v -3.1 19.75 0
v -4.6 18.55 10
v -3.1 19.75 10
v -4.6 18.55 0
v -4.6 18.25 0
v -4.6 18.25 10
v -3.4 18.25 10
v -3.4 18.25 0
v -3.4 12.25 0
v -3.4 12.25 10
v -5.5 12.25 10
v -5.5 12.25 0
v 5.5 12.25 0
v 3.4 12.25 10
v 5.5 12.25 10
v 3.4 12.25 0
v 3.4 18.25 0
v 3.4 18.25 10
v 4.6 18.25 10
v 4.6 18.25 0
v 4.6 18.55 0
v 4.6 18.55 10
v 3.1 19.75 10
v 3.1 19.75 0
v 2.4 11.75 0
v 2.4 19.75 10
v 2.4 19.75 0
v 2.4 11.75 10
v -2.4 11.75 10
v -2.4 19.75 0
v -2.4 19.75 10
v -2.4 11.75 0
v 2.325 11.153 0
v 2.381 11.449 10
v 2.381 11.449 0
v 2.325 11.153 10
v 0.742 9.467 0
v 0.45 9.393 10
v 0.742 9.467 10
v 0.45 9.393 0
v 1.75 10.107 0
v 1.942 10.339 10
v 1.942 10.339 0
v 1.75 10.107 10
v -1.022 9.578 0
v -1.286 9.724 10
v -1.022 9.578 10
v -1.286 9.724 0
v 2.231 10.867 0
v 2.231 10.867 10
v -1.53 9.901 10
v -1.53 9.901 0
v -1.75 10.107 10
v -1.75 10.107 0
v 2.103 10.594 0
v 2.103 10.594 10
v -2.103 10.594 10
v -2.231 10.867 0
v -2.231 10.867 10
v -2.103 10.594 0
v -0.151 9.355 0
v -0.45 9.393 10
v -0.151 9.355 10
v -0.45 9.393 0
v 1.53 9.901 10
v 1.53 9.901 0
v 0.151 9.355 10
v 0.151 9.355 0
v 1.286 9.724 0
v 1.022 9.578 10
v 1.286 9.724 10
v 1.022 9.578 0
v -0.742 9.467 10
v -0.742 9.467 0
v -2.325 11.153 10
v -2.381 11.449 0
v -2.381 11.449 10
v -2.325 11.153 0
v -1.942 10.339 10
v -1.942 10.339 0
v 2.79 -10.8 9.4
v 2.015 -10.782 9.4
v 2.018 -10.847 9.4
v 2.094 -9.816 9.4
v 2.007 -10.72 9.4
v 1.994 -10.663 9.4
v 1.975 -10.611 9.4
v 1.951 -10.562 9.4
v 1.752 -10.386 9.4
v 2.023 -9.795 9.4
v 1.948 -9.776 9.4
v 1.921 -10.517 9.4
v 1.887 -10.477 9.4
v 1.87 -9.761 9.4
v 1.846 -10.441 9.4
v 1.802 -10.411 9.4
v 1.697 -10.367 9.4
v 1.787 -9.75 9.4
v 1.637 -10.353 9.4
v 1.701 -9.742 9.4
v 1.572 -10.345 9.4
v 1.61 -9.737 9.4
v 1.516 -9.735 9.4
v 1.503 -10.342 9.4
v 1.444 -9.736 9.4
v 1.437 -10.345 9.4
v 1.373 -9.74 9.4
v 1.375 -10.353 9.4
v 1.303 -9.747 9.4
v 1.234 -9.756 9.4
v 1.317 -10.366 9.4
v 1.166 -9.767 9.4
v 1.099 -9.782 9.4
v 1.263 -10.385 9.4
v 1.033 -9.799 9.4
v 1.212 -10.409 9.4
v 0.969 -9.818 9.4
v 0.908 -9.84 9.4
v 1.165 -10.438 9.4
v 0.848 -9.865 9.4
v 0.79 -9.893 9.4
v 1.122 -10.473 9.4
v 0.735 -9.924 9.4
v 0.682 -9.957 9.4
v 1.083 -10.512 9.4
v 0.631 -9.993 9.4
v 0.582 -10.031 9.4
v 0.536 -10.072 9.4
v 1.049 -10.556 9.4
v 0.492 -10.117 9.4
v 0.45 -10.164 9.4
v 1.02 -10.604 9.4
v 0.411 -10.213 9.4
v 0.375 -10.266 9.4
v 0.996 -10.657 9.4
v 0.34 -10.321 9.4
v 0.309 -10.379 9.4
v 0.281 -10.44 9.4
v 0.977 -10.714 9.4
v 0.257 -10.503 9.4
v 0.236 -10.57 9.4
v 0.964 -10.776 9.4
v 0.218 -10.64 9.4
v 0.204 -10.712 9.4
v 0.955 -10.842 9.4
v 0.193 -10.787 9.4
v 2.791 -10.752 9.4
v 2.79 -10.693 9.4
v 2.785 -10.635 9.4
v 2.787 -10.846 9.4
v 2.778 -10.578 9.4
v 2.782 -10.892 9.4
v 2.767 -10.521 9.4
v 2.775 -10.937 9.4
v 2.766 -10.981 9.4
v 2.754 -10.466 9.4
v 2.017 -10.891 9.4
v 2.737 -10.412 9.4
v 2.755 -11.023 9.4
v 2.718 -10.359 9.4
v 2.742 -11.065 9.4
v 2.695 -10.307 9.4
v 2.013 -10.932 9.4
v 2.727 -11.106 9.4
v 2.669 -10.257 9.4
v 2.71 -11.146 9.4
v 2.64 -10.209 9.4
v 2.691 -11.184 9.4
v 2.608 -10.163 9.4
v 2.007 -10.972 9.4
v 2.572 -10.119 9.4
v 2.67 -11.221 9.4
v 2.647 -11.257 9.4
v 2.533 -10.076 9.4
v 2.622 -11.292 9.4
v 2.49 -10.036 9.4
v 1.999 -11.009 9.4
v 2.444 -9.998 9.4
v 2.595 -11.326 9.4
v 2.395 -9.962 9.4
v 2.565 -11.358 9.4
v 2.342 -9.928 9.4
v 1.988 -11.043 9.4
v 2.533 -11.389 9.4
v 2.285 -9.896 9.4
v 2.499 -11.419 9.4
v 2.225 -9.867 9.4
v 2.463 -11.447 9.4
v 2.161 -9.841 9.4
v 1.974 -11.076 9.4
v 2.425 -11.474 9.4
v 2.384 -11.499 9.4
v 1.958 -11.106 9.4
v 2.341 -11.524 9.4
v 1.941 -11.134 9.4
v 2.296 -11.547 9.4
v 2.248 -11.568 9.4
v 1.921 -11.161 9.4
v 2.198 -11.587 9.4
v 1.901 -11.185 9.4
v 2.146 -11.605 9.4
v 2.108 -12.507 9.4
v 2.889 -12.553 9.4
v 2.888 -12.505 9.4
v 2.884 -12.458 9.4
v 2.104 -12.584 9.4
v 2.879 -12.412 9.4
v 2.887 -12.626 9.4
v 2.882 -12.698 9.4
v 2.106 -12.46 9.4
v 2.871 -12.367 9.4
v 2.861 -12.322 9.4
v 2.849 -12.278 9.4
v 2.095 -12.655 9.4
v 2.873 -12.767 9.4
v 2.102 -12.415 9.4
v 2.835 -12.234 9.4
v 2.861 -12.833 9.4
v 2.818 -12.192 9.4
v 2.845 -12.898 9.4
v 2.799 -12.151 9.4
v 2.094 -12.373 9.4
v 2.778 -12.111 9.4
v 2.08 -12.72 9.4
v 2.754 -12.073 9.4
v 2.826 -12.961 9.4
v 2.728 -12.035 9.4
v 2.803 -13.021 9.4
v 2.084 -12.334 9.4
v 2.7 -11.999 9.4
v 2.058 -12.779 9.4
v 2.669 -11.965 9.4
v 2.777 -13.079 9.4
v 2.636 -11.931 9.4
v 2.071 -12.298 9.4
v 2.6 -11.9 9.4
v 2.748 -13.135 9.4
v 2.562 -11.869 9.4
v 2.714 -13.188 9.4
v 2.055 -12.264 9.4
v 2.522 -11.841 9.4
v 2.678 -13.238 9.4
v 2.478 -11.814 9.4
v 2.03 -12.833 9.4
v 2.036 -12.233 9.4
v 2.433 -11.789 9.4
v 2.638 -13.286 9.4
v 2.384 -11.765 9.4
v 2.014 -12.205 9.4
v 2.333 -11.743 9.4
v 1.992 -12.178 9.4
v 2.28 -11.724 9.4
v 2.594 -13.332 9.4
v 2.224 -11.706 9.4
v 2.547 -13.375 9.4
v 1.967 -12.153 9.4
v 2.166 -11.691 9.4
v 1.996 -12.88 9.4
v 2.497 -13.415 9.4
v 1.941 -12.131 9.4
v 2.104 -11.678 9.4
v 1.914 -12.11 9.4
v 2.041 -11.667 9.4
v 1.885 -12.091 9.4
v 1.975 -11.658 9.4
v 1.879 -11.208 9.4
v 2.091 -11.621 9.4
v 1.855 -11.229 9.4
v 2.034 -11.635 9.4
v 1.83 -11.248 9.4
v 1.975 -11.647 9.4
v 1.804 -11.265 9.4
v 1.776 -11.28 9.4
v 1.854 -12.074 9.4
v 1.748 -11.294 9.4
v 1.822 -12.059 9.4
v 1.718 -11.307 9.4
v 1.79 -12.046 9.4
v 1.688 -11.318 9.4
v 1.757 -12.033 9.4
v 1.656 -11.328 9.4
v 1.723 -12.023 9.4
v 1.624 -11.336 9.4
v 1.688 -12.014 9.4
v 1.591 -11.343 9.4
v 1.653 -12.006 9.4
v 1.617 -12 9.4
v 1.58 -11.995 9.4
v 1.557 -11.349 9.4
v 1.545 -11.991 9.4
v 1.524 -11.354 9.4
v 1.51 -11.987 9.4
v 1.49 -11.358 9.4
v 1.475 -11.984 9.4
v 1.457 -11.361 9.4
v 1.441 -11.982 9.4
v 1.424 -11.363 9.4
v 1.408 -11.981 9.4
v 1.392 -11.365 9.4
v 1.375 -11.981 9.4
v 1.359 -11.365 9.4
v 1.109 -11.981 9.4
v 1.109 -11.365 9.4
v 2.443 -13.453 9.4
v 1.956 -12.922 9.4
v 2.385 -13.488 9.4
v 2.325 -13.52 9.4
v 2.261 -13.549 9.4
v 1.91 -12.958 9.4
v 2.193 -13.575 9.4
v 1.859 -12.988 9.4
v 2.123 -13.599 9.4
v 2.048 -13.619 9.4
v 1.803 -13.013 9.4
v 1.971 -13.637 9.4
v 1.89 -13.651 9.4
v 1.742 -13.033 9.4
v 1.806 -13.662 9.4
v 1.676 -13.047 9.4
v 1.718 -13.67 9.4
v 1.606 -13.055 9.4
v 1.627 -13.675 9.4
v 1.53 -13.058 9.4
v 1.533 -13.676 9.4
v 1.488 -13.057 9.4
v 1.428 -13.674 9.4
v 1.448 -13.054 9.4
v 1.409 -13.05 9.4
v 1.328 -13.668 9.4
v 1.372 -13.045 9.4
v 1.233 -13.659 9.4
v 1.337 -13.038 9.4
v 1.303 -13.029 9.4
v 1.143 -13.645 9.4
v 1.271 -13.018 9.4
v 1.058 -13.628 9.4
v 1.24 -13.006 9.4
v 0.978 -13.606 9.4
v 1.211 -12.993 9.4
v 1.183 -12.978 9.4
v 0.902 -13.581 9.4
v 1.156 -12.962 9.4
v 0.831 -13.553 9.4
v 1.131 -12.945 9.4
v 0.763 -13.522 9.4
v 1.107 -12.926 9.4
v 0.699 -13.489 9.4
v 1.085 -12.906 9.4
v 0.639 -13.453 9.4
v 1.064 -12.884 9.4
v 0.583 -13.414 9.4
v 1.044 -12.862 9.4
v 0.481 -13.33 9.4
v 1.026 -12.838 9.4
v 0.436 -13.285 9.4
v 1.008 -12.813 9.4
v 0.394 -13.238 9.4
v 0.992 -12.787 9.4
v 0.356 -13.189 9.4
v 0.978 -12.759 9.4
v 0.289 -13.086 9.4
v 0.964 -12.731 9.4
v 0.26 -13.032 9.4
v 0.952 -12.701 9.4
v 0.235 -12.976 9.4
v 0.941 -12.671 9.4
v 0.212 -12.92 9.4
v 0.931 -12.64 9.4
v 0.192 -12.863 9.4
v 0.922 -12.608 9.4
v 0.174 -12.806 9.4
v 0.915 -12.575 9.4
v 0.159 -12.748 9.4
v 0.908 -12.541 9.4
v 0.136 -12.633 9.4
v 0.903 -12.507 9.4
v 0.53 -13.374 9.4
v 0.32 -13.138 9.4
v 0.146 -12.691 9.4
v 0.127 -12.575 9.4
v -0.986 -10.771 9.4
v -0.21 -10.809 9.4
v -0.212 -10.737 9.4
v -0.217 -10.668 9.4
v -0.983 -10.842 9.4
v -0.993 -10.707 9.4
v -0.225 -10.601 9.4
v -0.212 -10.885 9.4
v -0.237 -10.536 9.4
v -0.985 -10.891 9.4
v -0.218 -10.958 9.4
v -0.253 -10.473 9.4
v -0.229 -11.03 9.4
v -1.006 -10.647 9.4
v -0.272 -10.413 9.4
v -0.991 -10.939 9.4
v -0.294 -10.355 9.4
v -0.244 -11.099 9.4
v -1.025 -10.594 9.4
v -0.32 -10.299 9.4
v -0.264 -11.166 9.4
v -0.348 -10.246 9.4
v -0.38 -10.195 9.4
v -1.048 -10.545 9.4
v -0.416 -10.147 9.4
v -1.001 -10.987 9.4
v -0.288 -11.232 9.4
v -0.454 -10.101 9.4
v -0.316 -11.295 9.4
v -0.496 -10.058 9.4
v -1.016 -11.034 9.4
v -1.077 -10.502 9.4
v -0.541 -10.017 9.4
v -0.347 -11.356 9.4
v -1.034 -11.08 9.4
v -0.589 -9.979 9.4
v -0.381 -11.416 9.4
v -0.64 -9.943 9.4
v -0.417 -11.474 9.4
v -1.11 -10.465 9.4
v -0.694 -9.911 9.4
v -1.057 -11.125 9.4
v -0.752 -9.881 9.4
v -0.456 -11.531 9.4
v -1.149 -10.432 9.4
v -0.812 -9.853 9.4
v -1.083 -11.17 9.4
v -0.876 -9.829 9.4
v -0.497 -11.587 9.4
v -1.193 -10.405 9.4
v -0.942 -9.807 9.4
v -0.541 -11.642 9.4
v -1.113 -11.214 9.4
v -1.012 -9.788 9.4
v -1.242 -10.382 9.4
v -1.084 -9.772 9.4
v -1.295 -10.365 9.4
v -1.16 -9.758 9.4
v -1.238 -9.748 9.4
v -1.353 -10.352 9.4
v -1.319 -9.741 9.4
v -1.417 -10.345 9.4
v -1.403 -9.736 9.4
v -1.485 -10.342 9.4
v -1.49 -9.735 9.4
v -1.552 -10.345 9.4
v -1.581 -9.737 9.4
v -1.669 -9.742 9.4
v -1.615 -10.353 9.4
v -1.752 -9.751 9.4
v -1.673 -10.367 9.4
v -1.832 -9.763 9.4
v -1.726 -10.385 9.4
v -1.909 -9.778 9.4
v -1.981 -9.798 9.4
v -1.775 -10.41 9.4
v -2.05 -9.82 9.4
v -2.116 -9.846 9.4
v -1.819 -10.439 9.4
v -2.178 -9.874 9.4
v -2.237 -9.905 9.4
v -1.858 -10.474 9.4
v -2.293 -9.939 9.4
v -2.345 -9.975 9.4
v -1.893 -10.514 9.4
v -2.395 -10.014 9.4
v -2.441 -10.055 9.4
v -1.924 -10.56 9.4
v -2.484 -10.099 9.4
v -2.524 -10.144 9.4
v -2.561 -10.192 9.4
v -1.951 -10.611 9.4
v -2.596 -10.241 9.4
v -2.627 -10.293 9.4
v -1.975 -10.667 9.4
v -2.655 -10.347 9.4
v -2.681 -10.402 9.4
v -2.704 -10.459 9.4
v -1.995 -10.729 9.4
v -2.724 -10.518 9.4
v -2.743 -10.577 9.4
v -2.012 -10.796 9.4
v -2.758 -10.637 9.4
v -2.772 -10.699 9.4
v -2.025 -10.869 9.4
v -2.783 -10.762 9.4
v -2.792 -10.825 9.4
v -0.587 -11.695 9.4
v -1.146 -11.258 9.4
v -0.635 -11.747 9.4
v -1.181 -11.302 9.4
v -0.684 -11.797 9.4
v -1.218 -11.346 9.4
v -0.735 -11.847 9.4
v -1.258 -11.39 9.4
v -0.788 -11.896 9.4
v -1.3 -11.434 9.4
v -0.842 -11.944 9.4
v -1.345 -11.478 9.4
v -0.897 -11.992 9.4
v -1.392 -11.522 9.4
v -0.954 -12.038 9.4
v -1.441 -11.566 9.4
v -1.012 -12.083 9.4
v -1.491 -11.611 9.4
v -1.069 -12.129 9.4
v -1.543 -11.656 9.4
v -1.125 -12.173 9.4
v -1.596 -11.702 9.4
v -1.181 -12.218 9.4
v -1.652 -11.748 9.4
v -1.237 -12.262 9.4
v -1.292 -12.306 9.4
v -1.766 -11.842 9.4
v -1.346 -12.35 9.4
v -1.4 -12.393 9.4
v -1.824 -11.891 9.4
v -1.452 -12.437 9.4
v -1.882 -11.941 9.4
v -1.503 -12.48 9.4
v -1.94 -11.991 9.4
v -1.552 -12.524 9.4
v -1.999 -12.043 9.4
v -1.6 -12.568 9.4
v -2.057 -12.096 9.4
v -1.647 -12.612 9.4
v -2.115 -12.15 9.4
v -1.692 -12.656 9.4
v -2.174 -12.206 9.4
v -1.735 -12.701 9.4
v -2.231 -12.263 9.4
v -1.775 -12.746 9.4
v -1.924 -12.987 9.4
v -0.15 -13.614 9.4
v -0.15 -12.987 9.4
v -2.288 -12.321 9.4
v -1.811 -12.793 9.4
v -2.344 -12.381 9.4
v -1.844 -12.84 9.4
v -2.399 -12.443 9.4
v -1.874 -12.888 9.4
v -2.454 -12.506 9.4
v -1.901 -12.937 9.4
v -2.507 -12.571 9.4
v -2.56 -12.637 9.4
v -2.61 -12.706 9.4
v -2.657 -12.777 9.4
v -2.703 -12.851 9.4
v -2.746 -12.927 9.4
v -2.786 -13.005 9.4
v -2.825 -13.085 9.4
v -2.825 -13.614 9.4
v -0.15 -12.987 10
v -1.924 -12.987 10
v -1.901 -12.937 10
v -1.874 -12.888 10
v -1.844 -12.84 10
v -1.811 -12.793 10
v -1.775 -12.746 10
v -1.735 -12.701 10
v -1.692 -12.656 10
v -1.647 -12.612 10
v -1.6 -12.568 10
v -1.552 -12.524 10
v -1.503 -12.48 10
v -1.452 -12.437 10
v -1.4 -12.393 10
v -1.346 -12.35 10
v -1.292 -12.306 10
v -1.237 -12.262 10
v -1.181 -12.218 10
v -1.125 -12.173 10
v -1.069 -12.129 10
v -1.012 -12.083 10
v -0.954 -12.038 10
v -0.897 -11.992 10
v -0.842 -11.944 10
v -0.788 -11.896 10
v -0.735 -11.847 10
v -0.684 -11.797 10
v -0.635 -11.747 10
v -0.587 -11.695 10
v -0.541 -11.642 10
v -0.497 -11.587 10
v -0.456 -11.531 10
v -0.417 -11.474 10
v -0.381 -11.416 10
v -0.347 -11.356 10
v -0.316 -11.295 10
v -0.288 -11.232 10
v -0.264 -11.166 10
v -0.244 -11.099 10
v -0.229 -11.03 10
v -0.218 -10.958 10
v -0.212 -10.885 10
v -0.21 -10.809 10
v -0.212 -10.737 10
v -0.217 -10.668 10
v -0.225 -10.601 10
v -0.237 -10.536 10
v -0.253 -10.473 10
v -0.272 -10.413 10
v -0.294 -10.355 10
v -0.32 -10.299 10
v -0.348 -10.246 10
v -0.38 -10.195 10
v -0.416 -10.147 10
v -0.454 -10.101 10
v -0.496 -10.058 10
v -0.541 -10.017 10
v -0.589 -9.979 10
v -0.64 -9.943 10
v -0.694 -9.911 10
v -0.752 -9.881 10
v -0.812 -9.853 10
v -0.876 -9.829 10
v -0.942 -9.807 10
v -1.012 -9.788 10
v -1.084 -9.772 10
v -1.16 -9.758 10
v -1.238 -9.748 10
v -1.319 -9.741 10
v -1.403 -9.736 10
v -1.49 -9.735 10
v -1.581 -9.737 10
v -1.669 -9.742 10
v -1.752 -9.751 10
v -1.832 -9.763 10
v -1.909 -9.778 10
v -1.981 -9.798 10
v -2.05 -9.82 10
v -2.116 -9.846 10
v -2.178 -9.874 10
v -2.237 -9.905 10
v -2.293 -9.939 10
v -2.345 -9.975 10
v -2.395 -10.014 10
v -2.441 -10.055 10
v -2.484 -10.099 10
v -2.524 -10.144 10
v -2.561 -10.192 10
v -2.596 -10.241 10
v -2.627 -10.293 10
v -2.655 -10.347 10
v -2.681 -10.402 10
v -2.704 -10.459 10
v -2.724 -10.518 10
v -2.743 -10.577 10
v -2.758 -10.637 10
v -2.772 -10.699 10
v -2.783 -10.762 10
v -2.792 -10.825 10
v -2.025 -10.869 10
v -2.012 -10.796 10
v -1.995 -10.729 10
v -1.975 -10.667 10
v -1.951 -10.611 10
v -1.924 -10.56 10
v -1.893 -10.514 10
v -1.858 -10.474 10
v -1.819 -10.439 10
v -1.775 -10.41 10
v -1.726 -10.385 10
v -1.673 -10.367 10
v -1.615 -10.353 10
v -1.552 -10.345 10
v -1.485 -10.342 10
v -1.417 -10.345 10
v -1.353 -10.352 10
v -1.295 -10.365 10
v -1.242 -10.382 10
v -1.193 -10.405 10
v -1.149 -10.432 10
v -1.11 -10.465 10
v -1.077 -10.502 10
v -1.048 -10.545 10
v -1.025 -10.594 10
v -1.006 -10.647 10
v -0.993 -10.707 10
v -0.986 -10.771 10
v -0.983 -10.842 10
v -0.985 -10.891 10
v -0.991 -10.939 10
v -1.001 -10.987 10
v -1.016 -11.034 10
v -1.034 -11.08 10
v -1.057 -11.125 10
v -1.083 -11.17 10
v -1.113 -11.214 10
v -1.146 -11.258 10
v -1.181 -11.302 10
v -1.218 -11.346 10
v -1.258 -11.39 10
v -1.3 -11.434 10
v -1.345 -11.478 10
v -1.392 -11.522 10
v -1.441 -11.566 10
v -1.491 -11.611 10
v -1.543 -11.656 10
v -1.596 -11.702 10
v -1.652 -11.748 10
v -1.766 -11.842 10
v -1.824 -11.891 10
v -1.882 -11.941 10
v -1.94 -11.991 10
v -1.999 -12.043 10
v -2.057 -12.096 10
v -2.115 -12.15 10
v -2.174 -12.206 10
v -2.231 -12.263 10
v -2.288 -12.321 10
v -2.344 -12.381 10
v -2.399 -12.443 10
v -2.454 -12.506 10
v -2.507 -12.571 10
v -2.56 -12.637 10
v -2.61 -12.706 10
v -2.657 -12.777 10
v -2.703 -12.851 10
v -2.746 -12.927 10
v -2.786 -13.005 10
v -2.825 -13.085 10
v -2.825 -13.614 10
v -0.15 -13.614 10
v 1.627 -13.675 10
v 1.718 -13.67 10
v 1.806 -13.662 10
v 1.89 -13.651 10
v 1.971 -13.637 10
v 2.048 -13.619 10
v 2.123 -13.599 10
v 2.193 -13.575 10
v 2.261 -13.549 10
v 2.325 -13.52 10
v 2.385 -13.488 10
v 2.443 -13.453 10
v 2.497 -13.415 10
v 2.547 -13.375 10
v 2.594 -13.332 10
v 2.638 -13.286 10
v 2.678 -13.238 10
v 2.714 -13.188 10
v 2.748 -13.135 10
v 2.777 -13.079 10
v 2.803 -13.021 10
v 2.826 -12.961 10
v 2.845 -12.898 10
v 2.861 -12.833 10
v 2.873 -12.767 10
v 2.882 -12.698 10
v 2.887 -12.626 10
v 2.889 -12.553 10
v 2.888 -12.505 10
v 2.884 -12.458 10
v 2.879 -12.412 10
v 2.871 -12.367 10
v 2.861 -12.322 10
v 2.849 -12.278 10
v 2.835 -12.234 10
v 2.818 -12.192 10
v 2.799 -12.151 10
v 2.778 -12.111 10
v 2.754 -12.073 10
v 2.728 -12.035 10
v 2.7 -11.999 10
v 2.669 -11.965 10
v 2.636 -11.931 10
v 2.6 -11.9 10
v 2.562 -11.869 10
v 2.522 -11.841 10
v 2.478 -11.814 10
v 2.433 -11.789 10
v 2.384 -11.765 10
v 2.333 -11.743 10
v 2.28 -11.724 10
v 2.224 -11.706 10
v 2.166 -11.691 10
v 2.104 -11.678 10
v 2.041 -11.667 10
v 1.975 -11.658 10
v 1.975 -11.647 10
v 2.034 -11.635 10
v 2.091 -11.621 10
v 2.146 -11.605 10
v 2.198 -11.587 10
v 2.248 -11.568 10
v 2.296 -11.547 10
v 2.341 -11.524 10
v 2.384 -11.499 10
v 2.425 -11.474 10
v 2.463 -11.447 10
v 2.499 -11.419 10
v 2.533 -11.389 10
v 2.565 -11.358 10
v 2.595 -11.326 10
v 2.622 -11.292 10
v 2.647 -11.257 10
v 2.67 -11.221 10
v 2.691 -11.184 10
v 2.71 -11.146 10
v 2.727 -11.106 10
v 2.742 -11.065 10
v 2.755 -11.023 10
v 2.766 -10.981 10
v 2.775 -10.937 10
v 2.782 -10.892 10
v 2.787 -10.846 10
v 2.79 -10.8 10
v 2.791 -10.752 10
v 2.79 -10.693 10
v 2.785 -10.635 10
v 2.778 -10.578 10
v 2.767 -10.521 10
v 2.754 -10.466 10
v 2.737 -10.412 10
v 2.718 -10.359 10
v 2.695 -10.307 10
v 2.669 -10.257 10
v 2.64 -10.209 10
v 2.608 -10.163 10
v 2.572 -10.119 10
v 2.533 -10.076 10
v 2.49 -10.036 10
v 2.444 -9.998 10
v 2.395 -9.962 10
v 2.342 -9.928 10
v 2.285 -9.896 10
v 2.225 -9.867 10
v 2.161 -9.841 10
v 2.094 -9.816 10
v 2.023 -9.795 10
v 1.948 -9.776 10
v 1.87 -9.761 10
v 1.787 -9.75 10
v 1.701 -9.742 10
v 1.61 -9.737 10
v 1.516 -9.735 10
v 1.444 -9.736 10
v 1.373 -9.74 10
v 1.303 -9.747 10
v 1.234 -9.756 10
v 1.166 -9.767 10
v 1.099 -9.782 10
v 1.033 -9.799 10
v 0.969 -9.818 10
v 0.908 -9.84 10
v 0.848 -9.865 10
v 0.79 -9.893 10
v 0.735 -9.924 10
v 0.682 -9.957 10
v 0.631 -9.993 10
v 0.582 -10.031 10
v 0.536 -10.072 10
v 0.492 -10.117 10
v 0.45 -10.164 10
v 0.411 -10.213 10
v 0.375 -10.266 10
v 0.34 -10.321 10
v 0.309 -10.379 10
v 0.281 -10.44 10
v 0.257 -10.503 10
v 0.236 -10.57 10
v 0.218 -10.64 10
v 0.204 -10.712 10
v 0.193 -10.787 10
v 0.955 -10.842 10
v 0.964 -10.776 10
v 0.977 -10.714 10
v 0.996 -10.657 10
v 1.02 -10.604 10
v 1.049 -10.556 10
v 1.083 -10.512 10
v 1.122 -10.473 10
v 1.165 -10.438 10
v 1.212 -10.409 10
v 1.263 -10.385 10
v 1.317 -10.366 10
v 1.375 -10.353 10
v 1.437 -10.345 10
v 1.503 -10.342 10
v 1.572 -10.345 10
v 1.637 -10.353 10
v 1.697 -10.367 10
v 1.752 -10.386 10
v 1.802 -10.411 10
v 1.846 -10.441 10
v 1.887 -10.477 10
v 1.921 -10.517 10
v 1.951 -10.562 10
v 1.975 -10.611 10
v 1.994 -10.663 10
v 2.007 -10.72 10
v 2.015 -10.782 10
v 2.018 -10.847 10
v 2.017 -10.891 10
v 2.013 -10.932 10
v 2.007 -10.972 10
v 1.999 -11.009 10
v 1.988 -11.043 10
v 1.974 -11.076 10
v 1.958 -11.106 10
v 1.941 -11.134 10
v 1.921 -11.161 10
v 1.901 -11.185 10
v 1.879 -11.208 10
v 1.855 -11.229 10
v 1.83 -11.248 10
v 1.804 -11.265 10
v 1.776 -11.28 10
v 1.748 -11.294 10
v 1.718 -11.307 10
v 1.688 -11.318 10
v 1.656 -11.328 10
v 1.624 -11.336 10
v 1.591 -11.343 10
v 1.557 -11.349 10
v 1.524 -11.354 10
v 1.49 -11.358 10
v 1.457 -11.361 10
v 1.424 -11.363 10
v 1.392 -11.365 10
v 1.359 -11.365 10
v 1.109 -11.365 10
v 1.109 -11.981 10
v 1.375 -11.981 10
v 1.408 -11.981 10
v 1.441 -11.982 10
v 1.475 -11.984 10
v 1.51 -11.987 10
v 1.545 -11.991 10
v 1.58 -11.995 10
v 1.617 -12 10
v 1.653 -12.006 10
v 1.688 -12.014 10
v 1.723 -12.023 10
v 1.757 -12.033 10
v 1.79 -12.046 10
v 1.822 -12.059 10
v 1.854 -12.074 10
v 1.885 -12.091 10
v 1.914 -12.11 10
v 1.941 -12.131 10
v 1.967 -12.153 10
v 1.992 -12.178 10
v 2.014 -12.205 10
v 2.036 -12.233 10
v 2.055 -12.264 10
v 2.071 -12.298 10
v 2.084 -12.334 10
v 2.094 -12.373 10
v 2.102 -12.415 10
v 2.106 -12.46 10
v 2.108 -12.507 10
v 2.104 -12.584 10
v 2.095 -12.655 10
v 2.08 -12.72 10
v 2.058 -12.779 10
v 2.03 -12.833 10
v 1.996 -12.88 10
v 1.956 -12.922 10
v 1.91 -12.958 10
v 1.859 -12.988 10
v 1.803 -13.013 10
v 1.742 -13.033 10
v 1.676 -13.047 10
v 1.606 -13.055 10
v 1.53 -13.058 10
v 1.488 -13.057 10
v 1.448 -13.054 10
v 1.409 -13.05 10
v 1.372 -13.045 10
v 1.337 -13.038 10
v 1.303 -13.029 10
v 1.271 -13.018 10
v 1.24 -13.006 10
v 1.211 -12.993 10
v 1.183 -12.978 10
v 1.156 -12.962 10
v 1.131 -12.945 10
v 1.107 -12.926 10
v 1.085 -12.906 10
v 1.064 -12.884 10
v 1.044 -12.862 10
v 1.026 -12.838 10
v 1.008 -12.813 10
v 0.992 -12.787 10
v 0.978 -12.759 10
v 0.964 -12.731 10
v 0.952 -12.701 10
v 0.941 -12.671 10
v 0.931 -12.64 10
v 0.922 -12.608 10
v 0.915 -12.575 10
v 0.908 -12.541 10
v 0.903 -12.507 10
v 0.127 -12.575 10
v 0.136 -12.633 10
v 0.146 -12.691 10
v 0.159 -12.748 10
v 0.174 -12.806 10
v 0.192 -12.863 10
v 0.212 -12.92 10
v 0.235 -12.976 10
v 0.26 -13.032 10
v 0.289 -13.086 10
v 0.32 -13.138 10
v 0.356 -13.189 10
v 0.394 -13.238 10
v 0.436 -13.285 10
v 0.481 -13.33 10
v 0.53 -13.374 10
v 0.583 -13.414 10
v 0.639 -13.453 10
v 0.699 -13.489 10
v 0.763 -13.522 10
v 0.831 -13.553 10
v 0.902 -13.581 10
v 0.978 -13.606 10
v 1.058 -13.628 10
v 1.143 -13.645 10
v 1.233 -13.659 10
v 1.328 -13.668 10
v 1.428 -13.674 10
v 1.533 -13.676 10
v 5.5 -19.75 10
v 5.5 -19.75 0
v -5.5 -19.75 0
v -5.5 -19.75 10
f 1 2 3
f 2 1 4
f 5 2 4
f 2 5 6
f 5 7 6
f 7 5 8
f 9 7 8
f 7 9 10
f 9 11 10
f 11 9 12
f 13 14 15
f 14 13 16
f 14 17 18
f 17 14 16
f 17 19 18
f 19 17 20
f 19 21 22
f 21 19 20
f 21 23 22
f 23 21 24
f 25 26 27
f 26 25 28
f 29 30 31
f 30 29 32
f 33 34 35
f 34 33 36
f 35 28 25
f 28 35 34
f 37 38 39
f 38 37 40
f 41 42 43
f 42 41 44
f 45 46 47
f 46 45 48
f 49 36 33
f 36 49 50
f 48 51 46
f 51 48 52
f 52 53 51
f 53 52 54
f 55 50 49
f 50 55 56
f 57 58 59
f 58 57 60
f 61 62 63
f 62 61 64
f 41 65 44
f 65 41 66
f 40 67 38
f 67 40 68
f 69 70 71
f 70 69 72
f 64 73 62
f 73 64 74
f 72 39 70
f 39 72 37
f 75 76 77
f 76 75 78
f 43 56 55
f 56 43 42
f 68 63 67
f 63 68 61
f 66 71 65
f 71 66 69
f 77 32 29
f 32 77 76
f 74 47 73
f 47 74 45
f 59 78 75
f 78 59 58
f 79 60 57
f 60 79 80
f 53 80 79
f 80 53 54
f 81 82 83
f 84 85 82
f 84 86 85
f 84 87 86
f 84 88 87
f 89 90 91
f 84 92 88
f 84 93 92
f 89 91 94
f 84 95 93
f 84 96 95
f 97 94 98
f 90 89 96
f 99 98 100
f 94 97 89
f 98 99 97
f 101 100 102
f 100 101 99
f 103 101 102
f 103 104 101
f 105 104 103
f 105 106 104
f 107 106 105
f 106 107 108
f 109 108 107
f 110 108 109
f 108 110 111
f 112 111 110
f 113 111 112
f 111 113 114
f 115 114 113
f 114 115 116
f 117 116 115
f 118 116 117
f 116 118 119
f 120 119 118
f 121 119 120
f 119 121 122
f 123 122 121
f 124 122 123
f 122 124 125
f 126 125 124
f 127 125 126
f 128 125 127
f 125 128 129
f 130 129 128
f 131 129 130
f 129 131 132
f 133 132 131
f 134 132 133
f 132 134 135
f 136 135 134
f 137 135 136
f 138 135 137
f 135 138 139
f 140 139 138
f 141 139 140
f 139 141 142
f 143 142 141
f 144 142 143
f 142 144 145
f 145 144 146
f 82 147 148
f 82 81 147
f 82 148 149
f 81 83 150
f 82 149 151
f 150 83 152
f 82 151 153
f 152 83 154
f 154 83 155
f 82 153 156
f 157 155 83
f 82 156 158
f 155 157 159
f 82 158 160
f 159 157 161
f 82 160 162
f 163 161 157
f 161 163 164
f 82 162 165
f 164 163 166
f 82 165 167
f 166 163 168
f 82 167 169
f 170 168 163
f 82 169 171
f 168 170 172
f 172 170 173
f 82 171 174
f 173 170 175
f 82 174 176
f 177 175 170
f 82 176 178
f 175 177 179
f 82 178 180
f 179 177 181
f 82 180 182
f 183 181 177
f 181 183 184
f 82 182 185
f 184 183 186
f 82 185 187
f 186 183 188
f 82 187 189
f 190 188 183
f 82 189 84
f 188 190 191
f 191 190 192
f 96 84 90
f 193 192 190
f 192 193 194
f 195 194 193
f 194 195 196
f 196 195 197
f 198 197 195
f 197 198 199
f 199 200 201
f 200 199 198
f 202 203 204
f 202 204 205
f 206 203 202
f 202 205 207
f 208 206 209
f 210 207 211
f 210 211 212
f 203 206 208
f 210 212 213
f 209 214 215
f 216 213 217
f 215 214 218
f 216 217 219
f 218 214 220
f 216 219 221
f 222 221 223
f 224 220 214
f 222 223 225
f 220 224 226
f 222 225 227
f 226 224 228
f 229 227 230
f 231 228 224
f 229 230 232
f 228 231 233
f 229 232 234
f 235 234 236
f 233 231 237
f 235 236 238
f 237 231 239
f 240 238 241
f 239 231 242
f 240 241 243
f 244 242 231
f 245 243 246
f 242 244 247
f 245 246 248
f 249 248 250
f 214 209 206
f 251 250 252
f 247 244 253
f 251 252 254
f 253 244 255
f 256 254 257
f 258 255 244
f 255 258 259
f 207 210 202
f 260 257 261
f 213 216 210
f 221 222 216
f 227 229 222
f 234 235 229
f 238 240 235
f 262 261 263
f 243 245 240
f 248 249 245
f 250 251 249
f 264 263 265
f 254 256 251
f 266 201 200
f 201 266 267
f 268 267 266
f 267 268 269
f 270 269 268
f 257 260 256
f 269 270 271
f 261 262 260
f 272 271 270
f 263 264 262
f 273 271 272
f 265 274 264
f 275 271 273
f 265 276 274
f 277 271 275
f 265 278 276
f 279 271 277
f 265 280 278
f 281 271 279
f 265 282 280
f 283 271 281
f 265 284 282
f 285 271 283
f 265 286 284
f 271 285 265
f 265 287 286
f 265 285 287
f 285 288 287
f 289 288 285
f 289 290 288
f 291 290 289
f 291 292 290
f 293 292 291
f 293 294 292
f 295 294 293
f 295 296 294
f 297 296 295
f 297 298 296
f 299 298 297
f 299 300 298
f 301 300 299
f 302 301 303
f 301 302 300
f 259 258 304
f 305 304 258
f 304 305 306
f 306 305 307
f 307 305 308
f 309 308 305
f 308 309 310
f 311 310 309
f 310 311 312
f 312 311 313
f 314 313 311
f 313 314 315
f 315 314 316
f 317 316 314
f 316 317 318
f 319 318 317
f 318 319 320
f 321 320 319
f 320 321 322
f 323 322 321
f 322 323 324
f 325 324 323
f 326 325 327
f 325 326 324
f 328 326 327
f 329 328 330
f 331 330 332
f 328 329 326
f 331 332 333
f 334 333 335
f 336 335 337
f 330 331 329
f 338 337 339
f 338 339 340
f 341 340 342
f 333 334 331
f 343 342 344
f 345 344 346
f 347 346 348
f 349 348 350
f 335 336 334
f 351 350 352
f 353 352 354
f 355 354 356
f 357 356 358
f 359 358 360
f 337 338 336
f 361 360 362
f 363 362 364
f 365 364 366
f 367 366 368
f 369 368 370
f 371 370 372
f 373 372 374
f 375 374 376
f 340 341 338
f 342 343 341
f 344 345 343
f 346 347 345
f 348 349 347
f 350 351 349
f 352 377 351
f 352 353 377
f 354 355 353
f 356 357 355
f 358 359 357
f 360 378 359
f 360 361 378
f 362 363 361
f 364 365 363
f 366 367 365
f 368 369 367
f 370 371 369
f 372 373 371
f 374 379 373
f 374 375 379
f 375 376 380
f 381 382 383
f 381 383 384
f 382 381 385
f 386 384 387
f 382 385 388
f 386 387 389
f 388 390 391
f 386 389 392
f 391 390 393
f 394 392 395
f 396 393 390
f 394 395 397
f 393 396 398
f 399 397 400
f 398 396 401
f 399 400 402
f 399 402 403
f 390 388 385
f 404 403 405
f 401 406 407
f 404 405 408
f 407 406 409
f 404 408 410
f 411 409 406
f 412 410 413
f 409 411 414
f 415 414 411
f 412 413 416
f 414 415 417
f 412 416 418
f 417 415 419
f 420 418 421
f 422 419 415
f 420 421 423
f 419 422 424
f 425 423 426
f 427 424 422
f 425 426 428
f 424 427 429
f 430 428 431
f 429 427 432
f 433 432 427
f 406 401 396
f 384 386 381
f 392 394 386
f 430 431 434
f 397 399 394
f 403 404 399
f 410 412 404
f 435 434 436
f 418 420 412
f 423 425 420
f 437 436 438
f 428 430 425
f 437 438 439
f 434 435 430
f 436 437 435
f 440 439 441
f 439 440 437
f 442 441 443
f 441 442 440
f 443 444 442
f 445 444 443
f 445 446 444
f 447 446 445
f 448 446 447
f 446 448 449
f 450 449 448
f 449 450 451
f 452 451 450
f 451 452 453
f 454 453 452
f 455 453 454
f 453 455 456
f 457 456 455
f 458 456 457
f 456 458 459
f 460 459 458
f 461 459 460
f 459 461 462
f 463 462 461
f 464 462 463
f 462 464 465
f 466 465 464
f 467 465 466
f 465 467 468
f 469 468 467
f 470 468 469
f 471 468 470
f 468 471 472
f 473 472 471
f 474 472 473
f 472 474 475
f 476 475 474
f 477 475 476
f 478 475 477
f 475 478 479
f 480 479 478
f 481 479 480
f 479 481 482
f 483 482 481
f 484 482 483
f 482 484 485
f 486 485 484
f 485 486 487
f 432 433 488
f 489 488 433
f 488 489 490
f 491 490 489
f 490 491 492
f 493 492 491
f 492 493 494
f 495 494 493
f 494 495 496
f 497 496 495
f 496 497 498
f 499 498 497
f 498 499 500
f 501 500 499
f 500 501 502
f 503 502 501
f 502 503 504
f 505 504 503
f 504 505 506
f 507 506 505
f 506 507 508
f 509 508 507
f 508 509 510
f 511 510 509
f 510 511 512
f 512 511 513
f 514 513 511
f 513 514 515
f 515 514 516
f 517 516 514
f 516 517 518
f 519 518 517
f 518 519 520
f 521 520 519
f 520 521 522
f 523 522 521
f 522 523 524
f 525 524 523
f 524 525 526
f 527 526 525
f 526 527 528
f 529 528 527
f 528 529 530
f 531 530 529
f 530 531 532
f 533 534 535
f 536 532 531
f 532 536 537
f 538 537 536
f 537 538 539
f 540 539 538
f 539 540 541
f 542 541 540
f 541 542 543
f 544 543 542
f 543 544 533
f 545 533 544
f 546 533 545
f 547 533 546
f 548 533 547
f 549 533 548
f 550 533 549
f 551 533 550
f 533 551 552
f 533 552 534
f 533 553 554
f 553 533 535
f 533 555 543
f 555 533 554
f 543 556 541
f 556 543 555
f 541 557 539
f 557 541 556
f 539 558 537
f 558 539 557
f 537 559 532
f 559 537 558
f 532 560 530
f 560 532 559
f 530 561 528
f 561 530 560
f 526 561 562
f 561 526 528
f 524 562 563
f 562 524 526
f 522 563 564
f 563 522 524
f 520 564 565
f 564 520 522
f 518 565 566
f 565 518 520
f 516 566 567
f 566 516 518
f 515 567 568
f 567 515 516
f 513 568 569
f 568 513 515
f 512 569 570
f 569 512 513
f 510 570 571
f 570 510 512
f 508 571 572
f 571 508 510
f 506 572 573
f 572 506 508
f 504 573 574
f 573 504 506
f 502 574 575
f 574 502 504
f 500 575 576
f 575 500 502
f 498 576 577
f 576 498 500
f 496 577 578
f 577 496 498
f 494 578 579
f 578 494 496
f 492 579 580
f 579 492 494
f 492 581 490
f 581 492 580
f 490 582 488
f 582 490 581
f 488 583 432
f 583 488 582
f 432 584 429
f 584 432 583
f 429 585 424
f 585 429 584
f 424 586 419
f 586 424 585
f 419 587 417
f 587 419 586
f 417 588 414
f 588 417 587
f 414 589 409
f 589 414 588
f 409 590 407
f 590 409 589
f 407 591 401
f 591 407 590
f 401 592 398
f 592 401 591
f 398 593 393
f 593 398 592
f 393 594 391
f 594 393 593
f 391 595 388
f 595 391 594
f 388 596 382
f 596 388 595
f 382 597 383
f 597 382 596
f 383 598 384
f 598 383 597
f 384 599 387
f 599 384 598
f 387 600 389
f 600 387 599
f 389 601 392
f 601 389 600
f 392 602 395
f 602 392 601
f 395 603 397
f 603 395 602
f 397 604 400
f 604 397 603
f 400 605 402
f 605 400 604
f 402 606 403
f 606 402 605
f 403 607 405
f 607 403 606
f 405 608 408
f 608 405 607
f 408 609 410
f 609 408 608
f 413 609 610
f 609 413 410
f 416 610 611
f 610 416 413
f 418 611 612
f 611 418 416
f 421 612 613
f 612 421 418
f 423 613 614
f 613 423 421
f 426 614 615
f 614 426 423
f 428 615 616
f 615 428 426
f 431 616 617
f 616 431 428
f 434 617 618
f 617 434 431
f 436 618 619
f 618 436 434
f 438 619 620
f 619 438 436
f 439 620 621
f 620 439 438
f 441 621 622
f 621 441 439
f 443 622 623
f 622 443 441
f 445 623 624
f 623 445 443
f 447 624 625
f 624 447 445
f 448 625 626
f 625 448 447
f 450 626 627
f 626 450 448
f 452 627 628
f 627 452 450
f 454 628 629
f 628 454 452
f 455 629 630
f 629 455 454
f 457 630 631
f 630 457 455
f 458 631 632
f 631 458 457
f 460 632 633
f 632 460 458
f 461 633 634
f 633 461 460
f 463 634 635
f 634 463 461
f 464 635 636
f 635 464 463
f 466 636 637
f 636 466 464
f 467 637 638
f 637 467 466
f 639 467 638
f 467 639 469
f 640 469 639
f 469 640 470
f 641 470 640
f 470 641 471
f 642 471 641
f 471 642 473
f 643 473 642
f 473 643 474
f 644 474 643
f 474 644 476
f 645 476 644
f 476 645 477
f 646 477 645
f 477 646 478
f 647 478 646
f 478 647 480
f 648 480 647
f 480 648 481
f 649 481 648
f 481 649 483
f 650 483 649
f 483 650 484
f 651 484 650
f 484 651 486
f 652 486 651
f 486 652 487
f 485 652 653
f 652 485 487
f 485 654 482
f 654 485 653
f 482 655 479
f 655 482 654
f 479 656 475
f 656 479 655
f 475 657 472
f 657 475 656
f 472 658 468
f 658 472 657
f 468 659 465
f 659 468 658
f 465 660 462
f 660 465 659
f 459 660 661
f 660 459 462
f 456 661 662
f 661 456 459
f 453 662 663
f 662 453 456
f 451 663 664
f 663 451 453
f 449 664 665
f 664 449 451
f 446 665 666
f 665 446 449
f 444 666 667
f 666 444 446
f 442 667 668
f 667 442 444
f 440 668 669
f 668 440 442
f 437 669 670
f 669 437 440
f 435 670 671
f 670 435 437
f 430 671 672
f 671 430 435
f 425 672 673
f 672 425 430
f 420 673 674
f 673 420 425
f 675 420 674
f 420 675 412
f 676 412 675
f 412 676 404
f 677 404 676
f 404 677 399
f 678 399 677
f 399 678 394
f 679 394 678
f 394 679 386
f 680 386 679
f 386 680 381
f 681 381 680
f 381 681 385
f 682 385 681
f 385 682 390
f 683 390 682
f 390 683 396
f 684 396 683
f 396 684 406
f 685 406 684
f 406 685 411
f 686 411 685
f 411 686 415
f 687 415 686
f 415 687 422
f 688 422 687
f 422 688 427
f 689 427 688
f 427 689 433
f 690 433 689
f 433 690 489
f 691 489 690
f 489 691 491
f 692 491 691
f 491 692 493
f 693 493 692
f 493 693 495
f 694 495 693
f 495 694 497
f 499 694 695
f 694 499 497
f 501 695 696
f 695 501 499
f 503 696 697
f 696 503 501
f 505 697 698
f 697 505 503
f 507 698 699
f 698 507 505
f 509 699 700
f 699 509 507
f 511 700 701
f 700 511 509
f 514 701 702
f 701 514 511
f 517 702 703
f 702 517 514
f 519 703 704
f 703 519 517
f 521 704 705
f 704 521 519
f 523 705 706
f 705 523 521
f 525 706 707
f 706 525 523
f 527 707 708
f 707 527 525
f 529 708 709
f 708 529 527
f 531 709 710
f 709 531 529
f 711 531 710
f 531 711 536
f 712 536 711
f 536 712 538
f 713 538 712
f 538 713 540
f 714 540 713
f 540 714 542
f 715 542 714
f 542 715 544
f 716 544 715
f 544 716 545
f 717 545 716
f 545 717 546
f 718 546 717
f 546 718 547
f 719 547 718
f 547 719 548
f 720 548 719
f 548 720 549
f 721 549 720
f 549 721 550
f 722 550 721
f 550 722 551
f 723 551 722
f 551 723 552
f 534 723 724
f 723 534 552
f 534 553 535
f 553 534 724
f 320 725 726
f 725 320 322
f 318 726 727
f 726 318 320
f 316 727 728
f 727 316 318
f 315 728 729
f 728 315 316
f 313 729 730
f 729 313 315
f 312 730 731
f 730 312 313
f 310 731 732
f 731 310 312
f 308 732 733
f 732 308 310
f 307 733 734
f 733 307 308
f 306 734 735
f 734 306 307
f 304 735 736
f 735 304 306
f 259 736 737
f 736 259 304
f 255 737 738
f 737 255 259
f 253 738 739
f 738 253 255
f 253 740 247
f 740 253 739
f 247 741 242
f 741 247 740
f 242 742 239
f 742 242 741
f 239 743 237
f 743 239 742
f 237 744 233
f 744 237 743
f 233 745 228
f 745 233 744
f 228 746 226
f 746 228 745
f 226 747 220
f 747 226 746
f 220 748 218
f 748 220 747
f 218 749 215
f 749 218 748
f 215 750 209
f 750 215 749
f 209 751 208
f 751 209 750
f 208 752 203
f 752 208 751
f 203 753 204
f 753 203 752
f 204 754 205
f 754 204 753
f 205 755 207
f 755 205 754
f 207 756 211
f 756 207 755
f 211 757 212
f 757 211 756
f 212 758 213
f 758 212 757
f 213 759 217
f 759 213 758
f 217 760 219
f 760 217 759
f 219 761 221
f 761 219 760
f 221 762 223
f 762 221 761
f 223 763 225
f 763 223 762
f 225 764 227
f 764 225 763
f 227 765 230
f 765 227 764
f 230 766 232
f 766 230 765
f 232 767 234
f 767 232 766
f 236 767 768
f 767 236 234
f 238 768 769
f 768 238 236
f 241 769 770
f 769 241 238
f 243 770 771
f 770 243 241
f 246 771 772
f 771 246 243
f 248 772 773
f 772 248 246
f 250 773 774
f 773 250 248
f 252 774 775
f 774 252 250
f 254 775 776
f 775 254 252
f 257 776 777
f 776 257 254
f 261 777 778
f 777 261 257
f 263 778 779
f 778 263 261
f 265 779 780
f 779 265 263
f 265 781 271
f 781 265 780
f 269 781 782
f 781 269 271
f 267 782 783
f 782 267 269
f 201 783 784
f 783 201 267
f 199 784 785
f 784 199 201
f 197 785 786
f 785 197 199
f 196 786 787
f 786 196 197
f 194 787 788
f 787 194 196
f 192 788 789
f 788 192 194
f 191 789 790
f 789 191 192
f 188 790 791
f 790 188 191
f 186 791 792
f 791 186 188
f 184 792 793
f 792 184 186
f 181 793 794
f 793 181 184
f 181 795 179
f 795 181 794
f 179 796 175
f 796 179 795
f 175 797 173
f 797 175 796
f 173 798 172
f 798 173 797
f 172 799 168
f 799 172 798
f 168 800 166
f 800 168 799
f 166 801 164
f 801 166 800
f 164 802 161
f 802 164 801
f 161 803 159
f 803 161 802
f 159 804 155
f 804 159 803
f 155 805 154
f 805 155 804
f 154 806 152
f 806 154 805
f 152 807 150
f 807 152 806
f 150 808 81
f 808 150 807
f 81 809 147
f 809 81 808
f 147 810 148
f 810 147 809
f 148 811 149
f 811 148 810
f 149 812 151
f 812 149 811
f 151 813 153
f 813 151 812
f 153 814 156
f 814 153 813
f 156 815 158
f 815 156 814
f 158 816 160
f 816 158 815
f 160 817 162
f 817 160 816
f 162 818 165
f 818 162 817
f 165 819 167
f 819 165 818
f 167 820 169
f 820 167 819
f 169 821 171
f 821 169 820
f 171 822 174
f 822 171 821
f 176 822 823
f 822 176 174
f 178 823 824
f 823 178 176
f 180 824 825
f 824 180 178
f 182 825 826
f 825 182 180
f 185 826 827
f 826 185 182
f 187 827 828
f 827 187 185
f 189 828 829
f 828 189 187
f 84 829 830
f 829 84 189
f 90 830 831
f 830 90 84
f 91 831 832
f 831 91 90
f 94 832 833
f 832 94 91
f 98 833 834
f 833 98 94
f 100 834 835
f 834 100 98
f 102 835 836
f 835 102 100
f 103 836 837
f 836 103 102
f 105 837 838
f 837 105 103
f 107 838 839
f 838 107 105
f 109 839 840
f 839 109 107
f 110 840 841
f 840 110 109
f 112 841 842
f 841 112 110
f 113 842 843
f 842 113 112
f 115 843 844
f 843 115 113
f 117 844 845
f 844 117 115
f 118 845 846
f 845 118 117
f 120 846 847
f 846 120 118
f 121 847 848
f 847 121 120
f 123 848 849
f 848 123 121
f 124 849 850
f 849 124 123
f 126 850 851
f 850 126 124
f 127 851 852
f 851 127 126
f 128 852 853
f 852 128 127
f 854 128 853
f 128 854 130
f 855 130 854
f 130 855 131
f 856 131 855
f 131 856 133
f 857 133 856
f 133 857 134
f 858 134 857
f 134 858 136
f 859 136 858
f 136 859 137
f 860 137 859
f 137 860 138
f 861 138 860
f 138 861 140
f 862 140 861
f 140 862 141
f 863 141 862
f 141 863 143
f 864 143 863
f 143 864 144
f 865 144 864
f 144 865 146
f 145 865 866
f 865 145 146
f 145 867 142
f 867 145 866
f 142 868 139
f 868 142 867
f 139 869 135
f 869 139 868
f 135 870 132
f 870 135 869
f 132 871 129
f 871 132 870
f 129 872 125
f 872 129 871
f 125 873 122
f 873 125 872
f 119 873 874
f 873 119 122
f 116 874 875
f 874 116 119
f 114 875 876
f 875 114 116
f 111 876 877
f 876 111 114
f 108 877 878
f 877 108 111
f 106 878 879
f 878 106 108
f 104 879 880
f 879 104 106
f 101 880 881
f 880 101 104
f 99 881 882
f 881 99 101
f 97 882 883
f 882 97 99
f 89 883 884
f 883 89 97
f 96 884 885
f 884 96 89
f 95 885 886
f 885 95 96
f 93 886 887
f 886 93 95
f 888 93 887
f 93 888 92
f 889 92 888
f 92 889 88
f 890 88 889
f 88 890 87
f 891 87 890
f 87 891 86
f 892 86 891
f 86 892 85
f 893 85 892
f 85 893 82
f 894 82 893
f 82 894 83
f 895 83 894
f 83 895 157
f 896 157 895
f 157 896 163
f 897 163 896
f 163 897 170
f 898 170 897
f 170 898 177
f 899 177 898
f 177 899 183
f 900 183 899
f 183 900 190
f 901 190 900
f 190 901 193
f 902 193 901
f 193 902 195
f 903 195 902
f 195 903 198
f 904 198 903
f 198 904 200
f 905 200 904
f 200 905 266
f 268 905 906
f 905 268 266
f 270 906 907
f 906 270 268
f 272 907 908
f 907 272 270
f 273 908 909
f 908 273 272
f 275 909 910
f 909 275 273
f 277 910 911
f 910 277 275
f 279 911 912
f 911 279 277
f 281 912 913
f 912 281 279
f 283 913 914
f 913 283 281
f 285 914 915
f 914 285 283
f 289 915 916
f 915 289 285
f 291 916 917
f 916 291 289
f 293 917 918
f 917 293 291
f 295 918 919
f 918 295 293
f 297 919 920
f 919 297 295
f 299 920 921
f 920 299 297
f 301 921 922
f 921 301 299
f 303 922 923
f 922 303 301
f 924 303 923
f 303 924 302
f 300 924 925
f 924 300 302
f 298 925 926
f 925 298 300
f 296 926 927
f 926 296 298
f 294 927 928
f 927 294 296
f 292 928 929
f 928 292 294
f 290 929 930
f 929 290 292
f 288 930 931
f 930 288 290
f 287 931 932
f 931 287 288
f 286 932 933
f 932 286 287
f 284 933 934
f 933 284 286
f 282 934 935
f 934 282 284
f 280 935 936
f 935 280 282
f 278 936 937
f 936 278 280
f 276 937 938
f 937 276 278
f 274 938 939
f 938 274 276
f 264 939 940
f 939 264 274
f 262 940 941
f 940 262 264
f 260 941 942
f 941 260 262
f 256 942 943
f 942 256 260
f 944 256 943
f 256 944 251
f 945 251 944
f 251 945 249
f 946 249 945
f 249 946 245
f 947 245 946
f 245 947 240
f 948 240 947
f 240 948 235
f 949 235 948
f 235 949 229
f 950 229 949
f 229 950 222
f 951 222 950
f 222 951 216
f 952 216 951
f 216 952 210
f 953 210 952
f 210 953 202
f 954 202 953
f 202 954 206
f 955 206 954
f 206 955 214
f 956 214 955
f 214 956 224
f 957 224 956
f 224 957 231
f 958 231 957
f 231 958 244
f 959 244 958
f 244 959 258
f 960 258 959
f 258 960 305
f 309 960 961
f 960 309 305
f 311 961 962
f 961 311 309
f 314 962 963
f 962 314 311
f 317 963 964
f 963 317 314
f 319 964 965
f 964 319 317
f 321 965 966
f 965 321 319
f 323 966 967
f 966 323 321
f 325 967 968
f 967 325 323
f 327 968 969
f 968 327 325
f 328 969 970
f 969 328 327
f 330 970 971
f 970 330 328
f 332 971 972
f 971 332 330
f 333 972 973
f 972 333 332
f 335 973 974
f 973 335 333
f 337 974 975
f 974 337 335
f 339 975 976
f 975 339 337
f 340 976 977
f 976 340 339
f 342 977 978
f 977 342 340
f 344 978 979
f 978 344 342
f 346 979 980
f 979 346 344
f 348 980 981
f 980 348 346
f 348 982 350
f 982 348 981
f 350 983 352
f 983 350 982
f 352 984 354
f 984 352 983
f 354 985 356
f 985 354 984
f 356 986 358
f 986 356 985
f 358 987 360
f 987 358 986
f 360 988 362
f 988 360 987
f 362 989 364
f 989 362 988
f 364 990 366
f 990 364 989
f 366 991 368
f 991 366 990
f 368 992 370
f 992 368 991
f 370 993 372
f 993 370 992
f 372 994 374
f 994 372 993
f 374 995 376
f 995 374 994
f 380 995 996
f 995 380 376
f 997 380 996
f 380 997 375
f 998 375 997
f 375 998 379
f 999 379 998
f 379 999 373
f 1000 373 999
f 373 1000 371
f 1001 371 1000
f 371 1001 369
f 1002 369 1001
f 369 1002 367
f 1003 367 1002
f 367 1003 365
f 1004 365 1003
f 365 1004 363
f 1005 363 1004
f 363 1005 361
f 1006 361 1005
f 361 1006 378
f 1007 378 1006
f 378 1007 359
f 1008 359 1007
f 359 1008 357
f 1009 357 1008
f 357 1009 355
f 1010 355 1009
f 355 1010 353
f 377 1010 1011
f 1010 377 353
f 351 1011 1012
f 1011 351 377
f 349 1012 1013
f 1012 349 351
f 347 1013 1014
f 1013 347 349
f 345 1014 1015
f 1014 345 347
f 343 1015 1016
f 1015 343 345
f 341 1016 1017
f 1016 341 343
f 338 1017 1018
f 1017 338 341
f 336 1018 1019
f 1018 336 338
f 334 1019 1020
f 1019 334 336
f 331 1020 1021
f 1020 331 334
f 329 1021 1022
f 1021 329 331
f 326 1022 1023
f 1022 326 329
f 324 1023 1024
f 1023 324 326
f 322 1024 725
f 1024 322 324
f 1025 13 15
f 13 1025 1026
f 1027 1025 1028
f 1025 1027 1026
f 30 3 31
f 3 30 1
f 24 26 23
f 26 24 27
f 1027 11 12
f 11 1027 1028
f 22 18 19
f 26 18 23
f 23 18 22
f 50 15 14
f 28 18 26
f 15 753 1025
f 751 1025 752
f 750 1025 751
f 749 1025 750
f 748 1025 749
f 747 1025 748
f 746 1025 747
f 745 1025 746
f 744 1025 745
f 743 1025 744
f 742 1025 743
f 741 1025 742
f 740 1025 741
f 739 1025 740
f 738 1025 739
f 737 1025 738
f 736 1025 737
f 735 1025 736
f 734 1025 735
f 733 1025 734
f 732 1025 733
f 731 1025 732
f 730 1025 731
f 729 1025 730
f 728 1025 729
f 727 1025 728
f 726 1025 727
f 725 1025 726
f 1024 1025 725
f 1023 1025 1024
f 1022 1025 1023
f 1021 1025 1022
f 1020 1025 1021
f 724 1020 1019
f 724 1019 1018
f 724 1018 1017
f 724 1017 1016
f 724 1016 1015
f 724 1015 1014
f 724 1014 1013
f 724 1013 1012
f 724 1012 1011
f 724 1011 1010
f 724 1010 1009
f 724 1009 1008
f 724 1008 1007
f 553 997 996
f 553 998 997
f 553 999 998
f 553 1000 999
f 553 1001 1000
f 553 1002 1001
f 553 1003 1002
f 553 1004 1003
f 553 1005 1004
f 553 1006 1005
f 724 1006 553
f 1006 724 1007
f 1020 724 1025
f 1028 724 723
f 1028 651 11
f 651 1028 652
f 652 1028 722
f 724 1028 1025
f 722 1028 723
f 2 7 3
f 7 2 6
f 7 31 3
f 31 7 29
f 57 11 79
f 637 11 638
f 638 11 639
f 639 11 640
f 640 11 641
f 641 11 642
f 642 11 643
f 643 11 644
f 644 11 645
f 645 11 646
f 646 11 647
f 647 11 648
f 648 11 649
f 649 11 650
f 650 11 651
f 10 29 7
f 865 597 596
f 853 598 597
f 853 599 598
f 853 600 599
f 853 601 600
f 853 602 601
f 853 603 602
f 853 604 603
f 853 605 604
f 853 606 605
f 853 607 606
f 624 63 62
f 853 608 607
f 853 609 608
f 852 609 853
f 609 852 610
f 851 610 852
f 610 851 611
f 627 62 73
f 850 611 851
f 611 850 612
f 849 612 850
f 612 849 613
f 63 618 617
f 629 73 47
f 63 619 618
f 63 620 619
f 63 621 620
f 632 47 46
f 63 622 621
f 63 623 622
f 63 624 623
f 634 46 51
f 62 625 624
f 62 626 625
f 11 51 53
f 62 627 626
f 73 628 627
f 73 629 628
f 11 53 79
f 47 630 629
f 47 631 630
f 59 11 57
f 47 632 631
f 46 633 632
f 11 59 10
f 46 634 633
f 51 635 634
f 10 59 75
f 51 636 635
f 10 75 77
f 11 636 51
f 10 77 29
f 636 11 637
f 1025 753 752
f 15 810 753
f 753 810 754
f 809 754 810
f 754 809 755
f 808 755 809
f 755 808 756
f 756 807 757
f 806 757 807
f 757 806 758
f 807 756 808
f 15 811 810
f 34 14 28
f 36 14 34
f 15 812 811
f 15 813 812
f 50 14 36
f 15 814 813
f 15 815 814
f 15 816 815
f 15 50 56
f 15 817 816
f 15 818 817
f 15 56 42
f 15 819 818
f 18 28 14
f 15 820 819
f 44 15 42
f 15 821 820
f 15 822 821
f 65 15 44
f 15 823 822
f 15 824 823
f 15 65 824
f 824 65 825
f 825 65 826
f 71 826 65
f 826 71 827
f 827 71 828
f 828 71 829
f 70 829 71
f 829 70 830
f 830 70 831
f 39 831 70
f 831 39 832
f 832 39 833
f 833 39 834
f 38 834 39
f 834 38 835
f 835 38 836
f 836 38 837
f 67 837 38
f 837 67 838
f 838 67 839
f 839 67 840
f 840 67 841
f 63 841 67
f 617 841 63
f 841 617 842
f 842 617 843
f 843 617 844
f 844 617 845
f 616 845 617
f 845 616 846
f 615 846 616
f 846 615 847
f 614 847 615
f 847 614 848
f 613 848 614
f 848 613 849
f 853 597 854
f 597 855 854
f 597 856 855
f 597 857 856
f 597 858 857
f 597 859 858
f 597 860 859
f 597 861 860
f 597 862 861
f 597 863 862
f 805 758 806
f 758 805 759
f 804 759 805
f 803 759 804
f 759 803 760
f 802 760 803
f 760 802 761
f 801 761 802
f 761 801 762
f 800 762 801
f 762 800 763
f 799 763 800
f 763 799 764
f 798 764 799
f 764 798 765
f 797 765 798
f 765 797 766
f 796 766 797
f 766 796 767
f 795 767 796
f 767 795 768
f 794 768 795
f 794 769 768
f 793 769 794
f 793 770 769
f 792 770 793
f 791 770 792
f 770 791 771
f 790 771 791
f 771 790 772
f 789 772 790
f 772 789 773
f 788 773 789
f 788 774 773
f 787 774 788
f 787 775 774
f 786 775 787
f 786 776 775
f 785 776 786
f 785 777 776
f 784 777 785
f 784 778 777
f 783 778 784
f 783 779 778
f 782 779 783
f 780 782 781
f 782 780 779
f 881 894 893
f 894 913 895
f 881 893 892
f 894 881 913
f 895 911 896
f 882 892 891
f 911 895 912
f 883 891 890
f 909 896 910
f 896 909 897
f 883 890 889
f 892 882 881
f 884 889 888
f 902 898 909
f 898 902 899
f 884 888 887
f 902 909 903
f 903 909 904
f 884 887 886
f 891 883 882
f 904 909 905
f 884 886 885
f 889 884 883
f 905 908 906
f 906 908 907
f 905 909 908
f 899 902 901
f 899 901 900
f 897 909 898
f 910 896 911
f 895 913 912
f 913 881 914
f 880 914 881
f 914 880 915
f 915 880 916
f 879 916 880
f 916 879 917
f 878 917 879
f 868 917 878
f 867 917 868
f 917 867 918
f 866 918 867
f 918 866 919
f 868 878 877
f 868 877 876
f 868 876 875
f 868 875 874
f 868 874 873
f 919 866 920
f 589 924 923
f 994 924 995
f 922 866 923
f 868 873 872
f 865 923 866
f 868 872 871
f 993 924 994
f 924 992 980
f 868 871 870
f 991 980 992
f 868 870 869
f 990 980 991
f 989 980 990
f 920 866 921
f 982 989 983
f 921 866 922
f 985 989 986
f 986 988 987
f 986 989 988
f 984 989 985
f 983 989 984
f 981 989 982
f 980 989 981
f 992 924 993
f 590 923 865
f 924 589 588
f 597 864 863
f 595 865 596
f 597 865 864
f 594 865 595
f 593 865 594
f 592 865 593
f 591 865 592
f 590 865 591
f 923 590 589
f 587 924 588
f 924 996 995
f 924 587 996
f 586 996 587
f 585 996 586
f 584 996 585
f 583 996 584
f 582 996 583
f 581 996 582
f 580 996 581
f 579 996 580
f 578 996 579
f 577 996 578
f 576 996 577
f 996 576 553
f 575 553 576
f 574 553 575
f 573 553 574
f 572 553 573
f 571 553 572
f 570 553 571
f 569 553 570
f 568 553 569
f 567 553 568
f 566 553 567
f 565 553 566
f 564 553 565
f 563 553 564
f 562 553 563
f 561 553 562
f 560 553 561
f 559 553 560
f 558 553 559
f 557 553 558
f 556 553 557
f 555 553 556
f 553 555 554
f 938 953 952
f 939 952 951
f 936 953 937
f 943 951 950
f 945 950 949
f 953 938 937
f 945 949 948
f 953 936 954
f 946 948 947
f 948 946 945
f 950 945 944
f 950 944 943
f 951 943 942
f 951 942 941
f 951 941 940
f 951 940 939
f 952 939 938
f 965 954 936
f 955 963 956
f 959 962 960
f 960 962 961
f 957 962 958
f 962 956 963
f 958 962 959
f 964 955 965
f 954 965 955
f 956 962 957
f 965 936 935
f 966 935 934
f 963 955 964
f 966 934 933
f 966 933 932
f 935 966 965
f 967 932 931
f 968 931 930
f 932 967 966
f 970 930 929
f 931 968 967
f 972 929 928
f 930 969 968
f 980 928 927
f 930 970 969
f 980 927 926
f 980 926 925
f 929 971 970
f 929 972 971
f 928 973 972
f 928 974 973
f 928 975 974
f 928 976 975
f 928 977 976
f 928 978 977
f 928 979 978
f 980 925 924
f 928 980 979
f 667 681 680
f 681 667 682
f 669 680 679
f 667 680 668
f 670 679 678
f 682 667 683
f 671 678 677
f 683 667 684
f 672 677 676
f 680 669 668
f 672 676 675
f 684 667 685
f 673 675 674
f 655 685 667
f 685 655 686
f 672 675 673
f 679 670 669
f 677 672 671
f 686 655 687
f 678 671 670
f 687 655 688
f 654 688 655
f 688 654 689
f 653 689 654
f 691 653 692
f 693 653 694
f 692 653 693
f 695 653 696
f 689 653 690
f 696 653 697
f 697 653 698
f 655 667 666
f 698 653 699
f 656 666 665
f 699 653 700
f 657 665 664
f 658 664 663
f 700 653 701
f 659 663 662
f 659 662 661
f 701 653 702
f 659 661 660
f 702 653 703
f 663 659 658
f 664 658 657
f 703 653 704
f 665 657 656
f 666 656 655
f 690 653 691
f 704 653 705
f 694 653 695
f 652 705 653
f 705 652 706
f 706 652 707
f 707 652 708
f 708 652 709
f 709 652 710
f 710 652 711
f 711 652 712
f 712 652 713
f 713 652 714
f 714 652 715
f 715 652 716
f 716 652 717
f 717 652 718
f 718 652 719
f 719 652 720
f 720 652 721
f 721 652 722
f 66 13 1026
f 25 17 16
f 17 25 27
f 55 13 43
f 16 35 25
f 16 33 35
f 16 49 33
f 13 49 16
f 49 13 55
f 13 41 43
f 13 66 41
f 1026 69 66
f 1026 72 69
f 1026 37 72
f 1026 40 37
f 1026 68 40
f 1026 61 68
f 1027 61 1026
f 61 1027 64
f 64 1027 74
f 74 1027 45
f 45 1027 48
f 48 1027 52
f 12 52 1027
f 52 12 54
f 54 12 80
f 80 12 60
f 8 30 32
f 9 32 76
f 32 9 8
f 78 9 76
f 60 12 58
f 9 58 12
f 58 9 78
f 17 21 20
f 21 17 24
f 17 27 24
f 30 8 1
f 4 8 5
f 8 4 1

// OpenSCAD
$fn = 50;

difference() {
	union() {
		translate(v = [0, 12.25, 0]) {
			rotate(a = [90, 0, 0]) {
				difference() {
					union() {
						translate(v = [-5.5, 0, -7.5]) {
							cube(size = [11.0, 10.0, 39.5]);
						}
					}
					union() {
						translate(v = [0, 10.1, 0]) {
							rotate(a = [90, 0, 0]) {
								linear_extrude(height = 10.2) {
									polygon(points = [[-3.1, -7.6], [-3.1, -7.5], [-4.6, -6.3], [-4.6, -6.0], [-3.4, -6.0], [-3.4, 0], [-5.6, 0], [-5.6, -7.6]]);
								}
							}
						}
						translate(v = [0, 10.1, 0]) {
							rotate(a = [90, 0, 0]) {
								linear_extrude(height = 10.2) {
									polygon(points = [[3.1, -7.6], [3.1, -7.5], [4.6, -6.3], [4.6, -6.0], [3.4, -6.0], [3.4, 0], [5.6, 0], [5.6, -7.6]]);
								}
							}
						}
						translate(v = [-2.4, -0.1, -7.6]) {
							cube(size = [4.8, 10.2, 8.1]);
						}
						translate(v = [0, 10.1, 0.5]) {
							rotate(a = [90, 0, 0]) {
								cylinder(h = 10.2, r = 2.4);
							}
						}
						translate(v = [0, 9.4, 24.0]) {
							rotate(a = [-90, 0, 0]) {
								linear_extrude(height = 0.7) {
									text(font = "Arial:style=Bold", halign = "center", size = 4.0, text = "23", valign = "center");
								}
							}
						}
					}
				}
			}
		}
	}
	union();
}
